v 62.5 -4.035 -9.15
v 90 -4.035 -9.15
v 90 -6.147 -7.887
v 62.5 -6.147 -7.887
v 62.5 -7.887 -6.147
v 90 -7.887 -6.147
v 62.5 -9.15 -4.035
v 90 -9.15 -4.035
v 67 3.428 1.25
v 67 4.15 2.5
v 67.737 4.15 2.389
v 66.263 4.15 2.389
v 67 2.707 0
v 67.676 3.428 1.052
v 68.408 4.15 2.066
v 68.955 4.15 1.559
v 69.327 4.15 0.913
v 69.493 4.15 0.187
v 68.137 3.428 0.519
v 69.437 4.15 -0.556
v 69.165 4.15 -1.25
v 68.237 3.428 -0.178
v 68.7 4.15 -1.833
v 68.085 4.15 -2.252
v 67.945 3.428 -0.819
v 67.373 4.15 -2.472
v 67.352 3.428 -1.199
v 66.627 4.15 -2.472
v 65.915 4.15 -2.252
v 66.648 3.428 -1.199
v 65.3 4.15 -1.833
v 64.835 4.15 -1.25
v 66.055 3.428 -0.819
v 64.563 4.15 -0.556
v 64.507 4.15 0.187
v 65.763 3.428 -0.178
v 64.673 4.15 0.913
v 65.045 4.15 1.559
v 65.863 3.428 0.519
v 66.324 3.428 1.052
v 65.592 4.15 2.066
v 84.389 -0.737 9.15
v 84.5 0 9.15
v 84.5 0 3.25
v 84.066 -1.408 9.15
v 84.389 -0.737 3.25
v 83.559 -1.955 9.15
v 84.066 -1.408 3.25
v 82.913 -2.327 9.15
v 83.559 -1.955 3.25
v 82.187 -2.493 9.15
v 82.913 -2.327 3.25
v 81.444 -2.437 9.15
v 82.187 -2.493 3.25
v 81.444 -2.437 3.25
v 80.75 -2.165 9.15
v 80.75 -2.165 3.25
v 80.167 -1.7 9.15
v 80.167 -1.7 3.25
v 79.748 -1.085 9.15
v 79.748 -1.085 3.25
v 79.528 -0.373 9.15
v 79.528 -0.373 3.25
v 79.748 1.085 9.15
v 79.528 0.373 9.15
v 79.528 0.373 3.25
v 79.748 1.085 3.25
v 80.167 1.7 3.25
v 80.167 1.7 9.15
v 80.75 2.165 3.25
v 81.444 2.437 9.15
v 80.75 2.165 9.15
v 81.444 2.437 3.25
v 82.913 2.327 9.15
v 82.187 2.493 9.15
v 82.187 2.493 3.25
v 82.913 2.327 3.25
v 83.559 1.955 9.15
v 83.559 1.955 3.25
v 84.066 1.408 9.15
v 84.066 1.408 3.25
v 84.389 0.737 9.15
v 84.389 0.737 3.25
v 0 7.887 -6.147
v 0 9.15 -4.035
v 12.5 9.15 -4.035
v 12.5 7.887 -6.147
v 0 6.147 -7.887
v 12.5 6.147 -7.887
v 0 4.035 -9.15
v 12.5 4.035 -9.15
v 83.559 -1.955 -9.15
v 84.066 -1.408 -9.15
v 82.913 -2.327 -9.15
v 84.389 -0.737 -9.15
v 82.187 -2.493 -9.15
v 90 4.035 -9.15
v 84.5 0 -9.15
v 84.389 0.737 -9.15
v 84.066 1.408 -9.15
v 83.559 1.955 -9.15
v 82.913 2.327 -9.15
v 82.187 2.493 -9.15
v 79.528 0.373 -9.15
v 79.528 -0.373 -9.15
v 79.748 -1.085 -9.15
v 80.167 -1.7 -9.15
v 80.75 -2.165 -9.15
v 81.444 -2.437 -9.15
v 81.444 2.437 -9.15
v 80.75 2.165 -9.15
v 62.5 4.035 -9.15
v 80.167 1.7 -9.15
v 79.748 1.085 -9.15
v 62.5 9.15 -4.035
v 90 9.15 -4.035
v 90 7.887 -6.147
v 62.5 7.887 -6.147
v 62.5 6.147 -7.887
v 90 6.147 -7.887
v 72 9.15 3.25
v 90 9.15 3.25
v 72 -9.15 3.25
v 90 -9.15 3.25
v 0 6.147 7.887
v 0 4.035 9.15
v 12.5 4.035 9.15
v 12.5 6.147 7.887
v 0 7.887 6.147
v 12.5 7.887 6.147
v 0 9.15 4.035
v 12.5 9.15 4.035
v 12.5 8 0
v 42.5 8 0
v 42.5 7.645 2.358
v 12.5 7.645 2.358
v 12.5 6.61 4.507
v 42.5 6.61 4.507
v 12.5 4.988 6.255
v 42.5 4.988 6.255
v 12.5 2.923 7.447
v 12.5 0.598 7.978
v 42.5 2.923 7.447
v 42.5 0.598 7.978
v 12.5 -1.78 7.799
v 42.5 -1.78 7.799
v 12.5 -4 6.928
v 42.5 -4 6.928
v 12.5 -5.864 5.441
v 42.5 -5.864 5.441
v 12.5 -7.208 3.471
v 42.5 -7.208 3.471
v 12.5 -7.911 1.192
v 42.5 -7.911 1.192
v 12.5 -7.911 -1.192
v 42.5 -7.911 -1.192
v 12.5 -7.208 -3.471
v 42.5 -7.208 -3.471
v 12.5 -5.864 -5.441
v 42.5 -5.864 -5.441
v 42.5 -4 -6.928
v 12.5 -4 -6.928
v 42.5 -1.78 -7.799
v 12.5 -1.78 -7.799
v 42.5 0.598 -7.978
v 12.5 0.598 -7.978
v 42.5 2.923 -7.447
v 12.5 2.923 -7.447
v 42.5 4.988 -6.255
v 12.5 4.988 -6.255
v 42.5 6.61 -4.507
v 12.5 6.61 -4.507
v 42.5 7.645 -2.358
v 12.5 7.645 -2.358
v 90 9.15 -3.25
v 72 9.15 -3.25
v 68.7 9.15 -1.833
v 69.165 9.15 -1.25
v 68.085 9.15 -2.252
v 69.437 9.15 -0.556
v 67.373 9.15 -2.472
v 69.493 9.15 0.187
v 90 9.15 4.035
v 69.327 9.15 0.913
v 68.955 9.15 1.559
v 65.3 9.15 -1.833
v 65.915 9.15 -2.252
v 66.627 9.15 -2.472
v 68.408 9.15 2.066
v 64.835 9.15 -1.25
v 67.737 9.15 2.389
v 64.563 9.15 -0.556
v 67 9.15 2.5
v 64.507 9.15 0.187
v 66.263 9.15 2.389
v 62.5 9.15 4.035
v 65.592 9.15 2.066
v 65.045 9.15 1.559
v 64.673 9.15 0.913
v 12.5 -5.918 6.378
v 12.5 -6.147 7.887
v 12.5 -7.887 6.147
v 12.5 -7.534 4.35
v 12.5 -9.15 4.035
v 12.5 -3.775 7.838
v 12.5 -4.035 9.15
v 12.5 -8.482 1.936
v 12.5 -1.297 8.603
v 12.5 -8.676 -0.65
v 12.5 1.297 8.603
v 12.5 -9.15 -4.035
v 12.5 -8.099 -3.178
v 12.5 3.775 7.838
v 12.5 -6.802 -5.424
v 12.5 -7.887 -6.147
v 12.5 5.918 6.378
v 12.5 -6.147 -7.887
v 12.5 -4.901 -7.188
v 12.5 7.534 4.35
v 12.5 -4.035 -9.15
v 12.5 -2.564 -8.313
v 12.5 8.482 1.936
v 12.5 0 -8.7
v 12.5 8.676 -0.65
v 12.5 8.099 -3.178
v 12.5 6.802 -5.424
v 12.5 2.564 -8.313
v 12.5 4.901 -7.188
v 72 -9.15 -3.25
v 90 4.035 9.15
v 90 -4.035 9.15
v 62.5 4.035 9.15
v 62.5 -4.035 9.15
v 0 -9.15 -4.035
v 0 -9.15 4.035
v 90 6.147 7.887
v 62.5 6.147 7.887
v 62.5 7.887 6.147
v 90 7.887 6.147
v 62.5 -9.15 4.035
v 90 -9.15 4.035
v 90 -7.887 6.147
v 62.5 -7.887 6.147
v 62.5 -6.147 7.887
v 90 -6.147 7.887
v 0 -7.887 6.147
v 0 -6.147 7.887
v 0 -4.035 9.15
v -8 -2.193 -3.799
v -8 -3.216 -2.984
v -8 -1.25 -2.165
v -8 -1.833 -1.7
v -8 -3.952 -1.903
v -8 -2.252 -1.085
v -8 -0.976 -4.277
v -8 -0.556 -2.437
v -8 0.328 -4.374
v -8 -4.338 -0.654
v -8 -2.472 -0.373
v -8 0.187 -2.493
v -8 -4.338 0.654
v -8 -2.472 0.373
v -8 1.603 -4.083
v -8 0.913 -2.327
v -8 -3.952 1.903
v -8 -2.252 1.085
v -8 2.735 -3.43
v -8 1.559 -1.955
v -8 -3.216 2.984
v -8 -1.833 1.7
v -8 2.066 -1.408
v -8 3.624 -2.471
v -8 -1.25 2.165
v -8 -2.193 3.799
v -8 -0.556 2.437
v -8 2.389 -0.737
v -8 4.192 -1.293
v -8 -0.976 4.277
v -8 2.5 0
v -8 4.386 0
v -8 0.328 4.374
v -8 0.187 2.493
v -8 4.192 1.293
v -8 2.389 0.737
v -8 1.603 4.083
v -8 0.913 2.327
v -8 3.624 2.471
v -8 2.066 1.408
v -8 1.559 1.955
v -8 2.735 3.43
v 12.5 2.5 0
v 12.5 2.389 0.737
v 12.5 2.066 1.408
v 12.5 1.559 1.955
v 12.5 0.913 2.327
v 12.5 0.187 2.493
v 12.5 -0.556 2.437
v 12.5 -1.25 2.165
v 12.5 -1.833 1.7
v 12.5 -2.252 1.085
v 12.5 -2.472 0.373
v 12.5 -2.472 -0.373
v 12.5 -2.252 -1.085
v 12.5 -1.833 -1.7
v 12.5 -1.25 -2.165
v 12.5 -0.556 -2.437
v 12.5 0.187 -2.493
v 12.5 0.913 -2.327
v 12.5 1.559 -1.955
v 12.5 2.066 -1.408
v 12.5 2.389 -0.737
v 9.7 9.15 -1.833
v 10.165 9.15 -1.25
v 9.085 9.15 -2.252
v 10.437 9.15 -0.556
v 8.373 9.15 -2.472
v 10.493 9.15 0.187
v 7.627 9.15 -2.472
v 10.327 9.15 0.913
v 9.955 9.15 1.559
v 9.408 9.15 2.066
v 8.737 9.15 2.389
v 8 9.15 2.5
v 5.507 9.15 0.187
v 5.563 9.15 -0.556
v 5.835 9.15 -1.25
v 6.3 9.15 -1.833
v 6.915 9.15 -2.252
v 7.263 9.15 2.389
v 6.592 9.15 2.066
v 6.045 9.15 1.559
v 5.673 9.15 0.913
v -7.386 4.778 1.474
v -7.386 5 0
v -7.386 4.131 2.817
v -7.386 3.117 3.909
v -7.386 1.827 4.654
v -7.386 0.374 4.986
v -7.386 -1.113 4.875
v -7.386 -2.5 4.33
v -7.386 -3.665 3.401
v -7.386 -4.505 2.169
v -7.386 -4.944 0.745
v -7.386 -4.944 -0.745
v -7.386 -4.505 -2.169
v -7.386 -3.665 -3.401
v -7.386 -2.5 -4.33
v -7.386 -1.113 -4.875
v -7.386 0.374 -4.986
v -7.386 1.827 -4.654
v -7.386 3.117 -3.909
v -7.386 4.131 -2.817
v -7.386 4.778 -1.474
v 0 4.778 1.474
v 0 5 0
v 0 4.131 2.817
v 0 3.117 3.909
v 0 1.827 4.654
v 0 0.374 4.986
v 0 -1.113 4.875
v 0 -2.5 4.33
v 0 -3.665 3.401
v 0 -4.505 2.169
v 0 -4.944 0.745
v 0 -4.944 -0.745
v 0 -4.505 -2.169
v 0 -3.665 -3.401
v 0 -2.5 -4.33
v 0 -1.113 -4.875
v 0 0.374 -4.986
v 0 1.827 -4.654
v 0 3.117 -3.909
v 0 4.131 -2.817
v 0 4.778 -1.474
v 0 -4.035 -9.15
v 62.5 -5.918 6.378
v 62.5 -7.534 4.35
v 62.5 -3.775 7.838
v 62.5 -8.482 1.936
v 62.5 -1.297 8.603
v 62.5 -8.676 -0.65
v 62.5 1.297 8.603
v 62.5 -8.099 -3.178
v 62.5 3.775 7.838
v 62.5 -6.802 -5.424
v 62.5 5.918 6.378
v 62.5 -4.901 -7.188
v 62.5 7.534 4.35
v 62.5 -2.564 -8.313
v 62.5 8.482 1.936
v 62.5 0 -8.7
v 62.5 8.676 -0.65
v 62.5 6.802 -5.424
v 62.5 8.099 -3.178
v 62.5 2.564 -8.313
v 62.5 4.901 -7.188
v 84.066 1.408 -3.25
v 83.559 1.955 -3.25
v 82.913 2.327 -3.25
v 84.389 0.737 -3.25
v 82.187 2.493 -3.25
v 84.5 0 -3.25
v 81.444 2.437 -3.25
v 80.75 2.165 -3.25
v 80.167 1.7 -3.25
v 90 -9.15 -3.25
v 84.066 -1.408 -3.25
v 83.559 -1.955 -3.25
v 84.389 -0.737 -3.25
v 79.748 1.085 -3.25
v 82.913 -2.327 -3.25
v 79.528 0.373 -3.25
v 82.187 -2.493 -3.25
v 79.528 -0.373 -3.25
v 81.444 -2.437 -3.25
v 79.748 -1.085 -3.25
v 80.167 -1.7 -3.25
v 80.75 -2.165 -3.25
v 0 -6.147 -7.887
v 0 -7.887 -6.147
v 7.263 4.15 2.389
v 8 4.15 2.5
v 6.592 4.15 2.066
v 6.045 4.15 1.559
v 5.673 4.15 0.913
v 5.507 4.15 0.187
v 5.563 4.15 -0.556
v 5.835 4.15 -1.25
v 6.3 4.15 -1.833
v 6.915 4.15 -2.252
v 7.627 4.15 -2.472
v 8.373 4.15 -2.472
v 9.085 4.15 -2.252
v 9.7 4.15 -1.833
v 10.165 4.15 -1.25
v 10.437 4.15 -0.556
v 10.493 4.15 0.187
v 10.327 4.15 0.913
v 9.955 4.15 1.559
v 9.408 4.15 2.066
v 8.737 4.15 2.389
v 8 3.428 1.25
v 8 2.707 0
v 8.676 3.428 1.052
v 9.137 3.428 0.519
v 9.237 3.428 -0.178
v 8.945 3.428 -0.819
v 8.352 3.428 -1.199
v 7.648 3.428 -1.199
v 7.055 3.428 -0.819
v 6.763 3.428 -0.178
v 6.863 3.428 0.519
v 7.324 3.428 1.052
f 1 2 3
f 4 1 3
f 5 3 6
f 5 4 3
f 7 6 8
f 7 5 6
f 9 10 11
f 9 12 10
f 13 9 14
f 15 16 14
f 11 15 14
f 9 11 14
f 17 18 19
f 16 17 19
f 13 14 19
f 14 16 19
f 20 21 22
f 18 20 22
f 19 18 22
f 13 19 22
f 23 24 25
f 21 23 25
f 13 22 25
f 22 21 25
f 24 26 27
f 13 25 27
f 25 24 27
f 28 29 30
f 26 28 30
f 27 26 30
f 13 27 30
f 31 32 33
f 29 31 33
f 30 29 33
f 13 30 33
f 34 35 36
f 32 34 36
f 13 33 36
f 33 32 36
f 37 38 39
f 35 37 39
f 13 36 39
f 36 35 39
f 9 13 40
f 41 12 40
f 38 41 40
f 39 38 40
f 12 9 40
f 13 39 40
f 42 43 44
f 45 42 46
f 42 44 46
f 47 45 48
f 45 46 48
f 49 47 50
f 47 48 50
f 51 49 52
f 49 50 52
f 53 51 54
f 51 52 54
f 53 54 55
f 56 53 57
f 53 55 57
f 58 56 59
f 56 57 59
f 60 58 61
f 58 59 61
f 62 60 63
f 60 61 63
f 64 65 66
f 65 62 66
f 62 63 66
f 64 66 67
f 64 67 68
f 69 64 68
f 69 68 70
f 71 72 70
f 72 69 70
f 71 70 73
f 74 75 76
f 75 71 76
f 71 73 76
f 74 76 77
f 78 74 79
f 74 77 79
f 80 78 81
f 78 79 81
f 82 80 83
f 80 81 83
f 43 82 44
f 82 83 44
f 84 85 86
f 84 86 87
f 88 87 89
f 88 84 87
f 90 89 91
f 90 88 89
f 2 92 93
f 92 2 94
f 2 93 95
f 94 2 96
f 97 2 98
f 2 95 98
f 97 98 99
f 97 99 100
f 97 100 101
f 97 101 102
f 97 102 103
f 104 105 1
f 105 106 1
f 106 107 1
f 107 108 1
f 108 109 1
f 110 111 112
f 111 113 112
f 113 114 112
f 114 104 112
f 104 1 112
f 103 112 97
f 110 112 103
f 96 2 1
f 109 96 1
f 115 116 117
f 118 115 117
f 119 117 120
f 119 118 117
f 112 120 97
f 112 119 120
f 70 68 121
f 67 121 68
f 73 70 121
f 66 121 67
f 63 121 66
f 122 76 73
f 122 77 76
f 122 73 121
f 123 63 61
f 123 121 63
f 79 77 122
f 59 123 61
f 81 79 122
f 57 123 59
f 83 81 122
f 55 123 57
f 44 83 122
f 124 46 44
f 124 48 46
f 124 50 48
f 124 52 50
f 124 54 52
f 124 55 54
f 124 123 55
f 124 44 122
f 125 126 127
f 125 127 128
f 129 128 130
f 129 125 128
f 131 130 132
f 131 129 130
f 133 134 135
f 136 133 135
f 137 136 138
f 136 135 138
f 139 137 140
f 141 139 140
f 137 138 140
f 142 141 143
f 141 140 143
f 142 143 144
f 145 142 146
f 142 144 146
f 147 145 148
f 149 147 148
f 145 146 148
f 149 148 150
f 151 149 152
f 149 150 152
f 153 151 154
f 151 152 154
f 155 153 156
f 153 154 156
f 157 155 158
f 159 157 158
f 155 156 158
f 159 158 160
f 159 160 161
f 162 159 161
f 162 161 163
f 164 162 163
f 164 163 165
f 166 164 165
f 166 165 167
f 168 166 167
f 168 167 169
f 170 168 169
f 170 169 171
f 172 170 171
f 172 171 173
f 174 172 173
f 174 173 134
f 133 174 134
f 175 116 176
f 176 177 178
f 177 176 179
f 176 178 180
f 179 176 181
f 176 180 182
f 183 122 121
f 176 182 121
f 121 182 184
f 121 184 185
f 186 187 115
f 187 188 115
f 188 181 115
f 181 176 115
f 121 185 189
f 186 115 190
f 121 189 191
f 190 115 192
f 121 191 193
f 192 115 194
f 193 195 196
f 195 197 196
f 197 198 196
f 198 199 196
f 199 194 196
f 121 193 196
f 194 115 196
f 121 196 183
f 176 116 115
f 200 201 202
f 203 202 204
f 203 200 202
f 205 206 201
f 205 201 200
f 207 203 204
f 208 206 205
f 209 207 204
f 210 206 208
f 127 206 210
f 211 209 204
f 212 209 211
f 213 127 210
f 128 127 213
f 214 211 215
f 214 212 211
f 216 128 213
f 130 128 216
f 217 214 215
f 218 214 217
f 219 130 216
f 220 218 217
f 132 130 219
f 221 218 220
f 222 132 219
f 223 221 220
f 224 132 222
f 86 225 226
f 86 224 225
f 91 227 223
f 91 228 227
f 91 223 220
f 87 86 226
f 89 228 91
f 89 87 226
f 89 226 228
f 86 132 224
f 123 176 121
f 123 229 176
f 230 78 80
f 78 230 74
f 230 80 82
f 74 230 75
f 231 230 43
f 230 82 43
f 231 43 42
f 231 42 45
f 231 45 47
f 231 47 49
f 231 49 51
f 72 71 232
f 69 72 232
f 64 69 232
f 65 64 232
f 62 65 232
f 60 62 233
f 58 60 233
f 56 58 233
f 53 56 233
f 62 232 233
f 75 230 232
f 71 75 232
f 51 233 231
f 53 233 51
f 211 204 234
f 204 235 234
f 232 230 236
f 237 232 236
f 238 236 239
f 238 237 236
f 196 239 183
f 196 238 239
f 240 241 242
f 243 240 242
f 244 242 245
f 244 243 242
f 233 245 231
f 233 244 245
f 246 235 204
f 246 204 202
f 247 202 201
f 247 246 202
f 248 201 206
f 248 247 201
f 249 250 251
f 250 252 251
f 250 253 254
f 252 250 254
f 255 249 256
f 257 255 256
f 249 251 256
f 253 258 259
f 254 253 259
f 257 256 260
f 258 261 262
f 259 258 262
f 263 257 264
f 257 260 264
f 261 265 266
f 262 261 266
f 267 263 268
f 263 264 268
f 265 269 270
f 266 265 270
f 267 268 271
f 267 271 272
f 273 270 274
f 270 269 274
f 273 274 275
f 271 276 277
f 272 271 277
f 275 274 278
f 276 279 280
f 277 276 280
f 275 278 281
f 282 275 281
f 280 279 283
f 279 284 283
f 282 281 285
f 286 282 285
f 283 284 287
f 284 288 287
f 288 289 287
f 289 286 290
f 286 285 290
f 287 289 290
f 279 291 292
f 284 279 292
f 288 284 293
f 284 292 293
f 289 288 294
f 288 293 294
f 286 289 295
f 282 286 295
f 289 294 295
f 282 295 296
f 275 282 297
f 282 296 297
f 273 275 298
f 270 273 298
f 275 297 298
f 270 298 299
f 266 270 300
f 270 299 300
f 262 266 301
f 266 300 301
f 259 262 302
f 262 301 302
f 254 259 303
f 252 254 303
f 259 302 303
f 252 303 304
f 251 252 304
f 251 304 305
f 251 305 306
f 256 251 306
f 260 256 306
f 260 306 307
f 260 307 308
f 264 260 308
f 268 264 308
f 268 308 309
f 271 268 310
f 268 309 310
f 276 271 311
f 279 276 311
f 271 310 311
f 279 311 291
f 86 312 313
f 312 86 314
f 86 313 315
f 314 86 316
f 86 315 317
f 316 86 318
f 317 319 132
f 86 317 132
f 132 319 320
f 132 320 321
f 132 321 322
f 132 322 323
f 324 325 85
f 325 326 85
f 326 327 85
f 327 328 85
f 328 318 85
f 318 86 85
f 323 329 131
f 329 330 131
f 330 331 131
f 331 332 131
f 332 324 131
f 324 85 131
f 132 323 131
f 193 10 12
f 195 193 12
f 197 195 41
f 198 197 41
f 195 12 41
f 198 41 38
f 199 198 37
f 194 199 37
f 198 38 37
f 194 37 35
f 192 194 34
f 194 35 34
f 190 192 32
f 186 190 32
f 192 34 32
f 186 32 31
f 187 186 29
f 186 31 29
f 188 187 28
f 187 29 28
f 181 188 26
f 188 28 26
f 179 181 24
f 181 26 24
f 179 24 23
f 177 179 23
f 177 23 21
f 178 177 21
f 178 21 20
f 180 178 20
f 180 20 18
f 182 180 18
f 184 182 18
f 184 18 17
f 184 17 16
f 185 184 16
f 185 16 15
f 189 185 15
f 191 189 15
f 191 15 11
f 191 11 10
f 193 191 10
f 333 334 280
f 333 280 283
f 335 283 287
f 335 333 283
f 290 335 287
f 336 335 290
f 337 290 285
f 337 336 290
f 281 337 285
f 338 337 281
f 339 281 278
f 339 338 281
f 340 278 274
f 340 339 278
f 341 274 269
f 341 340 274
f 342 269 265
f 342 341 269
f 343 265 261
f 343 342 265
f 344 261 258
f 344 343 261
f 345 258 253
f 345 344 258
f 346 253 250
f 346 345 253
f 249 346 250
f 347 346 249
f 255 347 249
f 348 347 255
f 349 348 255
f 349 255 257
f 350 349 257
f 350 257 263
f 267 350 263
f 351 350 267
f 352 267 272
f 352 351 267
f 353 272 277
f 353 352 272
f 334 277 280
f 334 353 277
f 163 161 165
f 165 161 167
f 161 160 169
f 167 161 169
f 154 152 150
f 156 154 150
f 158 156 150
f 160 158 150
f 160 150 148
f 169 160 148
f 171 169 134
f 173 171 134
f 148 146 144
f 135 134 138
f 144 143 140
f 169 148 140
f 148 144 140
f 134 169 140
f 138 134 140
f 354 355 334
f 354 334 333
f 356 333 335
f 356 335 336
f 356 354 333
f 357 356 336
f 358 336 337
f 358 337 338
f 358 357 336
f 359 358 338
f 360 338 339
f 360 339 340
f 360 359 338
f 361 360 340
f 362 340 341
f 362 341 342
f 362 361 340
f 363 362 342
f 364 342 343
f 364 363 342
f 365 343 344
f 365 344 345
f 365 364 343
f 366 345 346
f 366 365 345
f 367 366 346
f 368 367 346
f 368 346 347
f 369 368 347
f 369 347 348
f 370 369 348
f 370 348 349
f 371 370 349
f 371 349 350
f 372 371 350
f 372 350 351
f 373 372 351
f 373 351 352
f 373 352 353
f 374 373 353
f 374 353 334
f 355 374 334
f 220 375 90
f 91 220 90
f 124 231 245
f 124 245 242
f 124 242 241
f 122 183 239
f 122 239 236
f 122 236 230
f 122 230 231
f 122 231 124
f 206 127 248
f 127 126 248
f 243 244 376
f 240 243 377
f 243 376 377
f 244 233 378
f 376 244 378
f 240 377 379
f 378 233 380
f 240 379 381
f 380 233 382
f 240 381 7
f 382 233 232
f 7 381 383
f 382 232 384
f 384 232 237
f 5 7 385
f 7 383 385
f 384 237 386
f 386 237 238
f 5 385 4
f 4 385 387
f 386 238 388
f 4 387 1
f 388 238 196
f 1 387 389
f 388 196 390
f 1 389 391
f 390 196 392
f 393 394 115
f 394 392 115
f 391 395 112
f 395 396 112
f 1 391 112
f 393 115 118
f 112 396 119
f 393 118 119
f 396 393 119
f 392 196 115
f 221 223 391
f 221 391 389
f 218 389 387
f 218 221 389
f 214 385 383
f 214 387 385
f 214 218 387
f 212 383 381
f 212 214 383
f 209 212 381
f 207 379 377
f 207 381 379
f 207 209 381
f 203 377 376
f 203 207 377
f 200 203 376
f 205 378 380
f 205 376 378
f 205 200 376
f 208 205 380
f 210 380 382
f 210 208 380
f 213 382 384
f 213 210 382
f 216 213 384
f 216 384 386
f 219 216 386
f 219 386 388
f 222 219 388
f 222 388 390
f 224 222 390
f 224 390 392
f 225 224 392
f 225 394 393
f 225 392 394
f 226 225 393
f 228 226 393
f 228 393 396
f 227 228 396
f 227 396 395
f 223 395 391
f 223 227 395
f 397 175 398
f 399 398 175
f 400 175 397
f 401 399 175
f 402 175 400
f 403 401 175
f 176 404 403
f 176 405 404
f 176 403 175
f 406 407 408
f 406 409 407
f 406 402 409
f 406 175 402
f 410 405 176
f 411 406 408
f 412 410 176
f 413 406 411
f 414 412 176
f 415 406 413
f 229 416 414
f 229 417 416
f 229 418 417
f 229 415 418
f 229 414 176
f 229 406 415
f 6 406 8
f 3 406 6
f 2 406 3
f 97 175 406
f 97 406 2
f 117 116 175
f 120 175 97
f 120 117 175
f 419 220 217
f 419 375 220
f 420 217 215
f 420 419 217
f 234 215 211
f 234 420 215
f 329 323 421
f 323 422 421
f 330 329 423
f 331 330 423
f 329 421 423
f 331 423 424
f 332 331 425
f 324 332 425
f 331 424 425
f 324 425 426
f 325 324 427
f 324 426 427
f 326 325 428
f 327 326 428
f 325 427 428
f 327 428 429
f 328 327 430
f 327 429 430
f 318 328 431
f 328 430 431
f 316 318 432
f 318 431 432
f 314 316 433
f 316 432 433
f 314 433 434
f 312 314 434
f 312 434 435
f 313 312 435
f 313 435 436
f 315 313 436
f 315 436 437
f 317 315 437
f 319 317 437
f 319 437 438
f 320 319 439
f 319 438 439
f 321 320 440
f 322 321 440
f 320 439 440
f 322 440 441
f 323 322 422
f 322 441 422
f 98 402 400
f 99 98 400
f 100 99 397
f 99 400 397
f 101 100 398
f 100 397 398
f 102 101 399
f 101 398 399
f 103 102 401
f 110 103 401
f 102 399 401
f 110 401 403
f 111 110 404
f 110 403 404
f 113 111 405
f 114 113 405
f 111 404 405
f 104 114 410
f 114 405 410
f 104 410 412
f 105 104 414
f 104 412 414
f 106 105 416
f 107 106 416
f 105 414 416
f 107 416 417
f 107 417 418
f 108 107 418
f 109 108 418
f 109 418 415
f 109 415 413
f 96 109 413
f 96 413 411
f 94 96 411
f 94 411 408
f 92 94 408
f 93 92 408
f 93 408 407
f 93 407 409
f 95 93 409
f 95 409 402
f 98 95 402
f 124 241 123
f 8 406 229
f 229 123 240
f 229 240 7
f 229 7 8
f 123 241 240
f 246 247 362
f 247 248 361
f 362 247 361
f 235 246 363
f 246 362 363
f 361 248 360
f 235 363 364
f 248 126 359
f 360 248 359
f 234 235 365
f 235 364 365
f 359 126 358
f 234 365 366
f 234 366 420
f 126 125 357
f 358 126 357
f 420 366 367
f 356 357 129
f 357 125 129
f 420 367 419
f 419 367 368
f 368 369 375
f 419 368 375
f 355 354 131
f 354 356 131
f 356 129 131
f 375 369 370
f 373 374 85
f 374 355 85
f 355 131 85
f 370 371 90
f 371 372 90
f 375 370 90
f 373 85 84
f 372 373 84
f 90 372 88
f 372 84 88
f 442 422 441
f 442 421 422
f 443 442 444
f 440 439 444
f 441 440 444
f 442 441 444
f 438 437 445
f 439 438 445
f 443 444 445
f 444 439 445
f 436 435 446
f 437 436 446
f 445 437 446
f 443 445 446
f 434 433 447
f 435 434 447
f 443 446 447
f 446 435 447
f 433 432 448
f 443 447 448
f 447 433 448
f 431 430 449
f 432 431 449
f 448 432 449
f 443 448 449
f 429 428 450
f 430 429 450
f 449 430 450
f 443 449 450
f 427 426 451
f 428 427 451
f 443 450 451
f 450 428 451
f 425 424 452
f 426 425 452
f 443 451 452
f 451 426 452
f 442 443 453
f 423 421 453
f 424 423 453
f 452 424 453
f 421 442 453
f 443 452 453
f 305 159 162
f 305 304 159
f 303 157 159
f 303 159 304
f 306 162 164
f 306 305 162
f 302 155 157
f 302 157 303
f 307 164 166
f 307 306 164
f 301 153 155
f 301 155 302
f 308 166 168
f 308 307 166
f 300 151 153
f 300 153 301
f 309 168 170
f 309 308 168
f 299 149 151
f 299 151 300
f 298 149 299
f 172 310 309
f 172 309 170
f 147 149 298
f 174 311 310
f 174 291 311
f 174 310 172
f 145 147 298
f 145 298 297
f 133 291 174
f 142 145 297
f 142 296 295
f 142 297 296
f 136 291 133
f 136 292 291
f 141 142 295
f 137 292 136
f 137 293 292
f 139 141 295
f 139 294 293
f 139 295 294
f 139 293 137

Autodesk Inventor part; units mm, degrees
sketch "Sketch_8" plane through (0, 0, 0) normal (0, 0, 1) x (1, 0, 0)
  line L0 (0, 0) -> (-8, 0)
  line L1 (-8, 0) -> (-8, 4.3865)
  line L2 (-8, 4.3865) -> (-7.3865, 5)
  line L3 (-7.3865, 5) -> (0, 5)
  line L4 (0, 5) -> (0, 0)
  line L5 (0, 0) -> (-8, 0)
revolve "Revolution1" add sketch "Sketch_8" angle 360 about axis through (0, 0, 0) along (1, 0, 0)
thread "Thread1" size "M10x1" class "6g" standard "ISO Metric profile" length 5.8865
sketch "Sketch_9" plane through (0, 0, 0) normal (1, 0, 0) x (0, 0, -1)
  line L0 (-9.15, 4.0345) -> (-9.15, -4.0345)
  arc A0 (-9.15, -4.0345) -> (-4.0345, -9.15) centre (0, 0) ccw
  line L1 (-4.0345, -9.15) -> (4.0345, -9.15)
  arc A1 (4.0345, -9.15) -> (9.15, -4.0345) centre (0, 0) ccw
  line L2 (9.15, -4.0345) -> (9.15, 4.0345)
  arc A2 (9.15, 4.0345) -> (4.0345, 9.15) centre (0, 0) ccw
  line L3 (4.0345, 9.15) -> (-4.0345, 9.15)
  arc A3 (-4.0345, 9.15) -> (-9.15, 4.0345) centre (0, 0) ccw
extrude "Extrusion1" add sketch "Sketch_9" along normal blind 12.5
sketch "Sketch_11" plane through (12.5, 0, 0) normal (1, 0, 0) x (0, 0, -1)
  circle A0 centre (0, 0) radius 8.7
extrude "Extrusion2" add sketch "Sketch_11" along normal blind 50
sketch "Sketch_10" plane through (62.5, 0, 0) normal (1, 0, 0) x (0, 0, -1)
  line L0 (-9.15, 4.0345) -> (-9.15, -4.0345)
  arc A0 (-9.15, -4.0345) -> (-4.0345, -9.15) centre (0, 0) ccw
  line L1 (-4.0345, -9.15) -> (4.0345, -9.15)
  arc A1 (4.0345, -9.15) -> (9.15, -4.0345) centre (0, 0) ccw
  line L2 (9.15, -4.0345) -> (9.15, 4.0345)
  arc A2 (9.15, 4.0345) -> (4.0345, 9.15) centre (0, 0) ccw
  line L3 (4.0345, 9.15) -> (-4.0345, 9.15)
  arc A3 (-4.0345, 9.15) -> (-9.15, 4.0345) centre (0, 0) ccw
extrude "Extrusion3" add sketch "Sketch_10" along normal blind 27.5
sketch "Sketch5" plane through (0, 9.15, 4.0345) normal (0, 1, 0) x (1, 0, 0)
  point P0 (8, 4.0345)
hole "Hole1" at (8, 9.15, 0) direction (0, -1, 0) diameter 5 depth 5 tip angle 120
sketch "Sketch6" plane through (62.5, 9.15, 4.0345) normal (0, 1, 0) x (1, 0, 0)
  point P0 (4.5, 4.0345)
hole "Hole2" at (67, 9.15, 0) direction (0, -1, 0) diameter 5 depth 5 tip angle 120
sketch "Sketch_16" plane through (0, 0, 0) normal (0, 0, 1) x (1, 0, 0)
  line L0 (42.5, 0) -> (-8, 0)
  line L1 (-8, 0) -> (-8, 2.5)
  line L2 (-8, 2.5) -> (12.5, 2.5)
  line L3 (12.5, 2.5) -> (12.5, 8)
  line L4 (12.5, 8) -> (42.5, 8)
  line L5 (42.5, 8) -> (42.5, 0)
  line L6 (42.5, 0) -> (-8, 0)
revolve "Revolution2" cut sketch "Sketch_16" angle 360 about axis through (42.5, 0, 0) along (1, 0, 0)
sketch "Sketch_3" plane through (0, 0, 0) normal (0, 1, 0) x (-1, 0, 0)
  line L0 (-72, 3.25) -> (-90, 3.25)
  line L1 (-90, 3.25) -> (-90, -3.25)
  line L2 (-90, -3.25) -> (-72, -3.25)
  line L3 (-72, -3.25) -> (-72, 3.25)
extrude "Extrusion4" cut sketch "Sketch_3" along normal mid plane 18.3
sketch "Sketch_13" plane through (0, 0, 0) normal (0, 0, 1) x (1, 0, 0)
  circle A0 centre (82, 0) radius 2.5
extrude "Extrusion5" cut sketch "Sketch_13" along normal mid plane 18.3
ref_plane "BODY_N_XY" through (82, 0, 0) normal (0, 0, -1) x (1, 0, 0)
ref_plane "BODY_N_YZ" through (82, 0, 0) normal (1, 0, 0) x (0, -1, 0)
ref_plane "BODY_N_ZX" through (82, 0, 0) normal (0, -1, 0) x (0, 0, -1)
ref_plane "BODY_PIN_XY" through (82, 0, 0) normal (-1, 0, 0) x (0, 0, -1)
ref_plane "BODY_PIN_YZ" through (82, 0, 0) normal (0, 0, -1) x (0, -1, 0)
ref_plane "BODY_PIN_ZX" through (82, 0, 0) normal (0, -1, 0) x (-1, 0, 0)
ref_plane "NUT2_XY" through (72, 0, 0) normal (1, 0, 0) x (0, 0, -1)
ref_plane "NUT2_YZ" through (72, 0, 0) normal (0, 0, -1) x (0, 1, 0)
ref_plane "NUT2_ZX" through (72, 0, 0) normal (0, 1, 0) x (1, 0, 0)
ref_plane "SW1_XY" through (17.5, 0, 0) normal (1, 0, 0) x (0, 0, -1)
ref_plane "SW1_YZ" through (17.5, 0, 0) normal (0, 0, -1) x (0, 1, 0)
ref_plane "SW1_ZX" through (17.5, 0, 0) normal (0, 1, 0) x (1, 0, 0)
ref_plane "SW2_XY" through (57.5, 0, 0) normal (-1, 0, 0) x (0, 0, -1)
ref_plane "SW2_YZ" through (57.5, 0, 0) normal (0, 0, -1) x (0, -1, 0)
ref_plane "SW2_ZX" through (57.5, 0, 0) normal (0, -1, 0) x (-1, 0, 0)
ref_plane "SW_R1_XY" through (17.5, -14.15, 0) normal (1, 0, 0) x (0, 0, -1)
ref_plane "SW_R1_YZ" through (17.5, -14.15, 0) normal (0, 0, -1) x (0, 1, 0)
ref_plane "SW_R1_ZX" through (17.5, -14.15, 0) normal (0, 1, 0) x (1, 0, 0)
ref_plane "SW_R2_XY" through (57.5, -14.15, 0) normal (-1, 0, 0) x (0, 0, -1)
ref_plane "SW_R2_YZ" through (57.5, -14.15, 0) normal (0, 0, -1) x (0, -1, 0)
ref_plane "SW_R2_ZX" through (57.5, -14.15, 0) normal (0, -1, 0) x (-1, 0, 0)
ref_plane "body_XY" through (0, 0, 0) normal (-1, 0, 0) x (0, 0, -1)
ref_plane "body_YZ" through (0, 0, 0) normal (0, 0, -1) x (0, -1, 0)
ref_plane "body_ZX" through (0, 0, 0) normal (0, -1, 0) x (-1, 0, 0)
properties part number "CJ2D16-25Z(1_1)_BODY"
